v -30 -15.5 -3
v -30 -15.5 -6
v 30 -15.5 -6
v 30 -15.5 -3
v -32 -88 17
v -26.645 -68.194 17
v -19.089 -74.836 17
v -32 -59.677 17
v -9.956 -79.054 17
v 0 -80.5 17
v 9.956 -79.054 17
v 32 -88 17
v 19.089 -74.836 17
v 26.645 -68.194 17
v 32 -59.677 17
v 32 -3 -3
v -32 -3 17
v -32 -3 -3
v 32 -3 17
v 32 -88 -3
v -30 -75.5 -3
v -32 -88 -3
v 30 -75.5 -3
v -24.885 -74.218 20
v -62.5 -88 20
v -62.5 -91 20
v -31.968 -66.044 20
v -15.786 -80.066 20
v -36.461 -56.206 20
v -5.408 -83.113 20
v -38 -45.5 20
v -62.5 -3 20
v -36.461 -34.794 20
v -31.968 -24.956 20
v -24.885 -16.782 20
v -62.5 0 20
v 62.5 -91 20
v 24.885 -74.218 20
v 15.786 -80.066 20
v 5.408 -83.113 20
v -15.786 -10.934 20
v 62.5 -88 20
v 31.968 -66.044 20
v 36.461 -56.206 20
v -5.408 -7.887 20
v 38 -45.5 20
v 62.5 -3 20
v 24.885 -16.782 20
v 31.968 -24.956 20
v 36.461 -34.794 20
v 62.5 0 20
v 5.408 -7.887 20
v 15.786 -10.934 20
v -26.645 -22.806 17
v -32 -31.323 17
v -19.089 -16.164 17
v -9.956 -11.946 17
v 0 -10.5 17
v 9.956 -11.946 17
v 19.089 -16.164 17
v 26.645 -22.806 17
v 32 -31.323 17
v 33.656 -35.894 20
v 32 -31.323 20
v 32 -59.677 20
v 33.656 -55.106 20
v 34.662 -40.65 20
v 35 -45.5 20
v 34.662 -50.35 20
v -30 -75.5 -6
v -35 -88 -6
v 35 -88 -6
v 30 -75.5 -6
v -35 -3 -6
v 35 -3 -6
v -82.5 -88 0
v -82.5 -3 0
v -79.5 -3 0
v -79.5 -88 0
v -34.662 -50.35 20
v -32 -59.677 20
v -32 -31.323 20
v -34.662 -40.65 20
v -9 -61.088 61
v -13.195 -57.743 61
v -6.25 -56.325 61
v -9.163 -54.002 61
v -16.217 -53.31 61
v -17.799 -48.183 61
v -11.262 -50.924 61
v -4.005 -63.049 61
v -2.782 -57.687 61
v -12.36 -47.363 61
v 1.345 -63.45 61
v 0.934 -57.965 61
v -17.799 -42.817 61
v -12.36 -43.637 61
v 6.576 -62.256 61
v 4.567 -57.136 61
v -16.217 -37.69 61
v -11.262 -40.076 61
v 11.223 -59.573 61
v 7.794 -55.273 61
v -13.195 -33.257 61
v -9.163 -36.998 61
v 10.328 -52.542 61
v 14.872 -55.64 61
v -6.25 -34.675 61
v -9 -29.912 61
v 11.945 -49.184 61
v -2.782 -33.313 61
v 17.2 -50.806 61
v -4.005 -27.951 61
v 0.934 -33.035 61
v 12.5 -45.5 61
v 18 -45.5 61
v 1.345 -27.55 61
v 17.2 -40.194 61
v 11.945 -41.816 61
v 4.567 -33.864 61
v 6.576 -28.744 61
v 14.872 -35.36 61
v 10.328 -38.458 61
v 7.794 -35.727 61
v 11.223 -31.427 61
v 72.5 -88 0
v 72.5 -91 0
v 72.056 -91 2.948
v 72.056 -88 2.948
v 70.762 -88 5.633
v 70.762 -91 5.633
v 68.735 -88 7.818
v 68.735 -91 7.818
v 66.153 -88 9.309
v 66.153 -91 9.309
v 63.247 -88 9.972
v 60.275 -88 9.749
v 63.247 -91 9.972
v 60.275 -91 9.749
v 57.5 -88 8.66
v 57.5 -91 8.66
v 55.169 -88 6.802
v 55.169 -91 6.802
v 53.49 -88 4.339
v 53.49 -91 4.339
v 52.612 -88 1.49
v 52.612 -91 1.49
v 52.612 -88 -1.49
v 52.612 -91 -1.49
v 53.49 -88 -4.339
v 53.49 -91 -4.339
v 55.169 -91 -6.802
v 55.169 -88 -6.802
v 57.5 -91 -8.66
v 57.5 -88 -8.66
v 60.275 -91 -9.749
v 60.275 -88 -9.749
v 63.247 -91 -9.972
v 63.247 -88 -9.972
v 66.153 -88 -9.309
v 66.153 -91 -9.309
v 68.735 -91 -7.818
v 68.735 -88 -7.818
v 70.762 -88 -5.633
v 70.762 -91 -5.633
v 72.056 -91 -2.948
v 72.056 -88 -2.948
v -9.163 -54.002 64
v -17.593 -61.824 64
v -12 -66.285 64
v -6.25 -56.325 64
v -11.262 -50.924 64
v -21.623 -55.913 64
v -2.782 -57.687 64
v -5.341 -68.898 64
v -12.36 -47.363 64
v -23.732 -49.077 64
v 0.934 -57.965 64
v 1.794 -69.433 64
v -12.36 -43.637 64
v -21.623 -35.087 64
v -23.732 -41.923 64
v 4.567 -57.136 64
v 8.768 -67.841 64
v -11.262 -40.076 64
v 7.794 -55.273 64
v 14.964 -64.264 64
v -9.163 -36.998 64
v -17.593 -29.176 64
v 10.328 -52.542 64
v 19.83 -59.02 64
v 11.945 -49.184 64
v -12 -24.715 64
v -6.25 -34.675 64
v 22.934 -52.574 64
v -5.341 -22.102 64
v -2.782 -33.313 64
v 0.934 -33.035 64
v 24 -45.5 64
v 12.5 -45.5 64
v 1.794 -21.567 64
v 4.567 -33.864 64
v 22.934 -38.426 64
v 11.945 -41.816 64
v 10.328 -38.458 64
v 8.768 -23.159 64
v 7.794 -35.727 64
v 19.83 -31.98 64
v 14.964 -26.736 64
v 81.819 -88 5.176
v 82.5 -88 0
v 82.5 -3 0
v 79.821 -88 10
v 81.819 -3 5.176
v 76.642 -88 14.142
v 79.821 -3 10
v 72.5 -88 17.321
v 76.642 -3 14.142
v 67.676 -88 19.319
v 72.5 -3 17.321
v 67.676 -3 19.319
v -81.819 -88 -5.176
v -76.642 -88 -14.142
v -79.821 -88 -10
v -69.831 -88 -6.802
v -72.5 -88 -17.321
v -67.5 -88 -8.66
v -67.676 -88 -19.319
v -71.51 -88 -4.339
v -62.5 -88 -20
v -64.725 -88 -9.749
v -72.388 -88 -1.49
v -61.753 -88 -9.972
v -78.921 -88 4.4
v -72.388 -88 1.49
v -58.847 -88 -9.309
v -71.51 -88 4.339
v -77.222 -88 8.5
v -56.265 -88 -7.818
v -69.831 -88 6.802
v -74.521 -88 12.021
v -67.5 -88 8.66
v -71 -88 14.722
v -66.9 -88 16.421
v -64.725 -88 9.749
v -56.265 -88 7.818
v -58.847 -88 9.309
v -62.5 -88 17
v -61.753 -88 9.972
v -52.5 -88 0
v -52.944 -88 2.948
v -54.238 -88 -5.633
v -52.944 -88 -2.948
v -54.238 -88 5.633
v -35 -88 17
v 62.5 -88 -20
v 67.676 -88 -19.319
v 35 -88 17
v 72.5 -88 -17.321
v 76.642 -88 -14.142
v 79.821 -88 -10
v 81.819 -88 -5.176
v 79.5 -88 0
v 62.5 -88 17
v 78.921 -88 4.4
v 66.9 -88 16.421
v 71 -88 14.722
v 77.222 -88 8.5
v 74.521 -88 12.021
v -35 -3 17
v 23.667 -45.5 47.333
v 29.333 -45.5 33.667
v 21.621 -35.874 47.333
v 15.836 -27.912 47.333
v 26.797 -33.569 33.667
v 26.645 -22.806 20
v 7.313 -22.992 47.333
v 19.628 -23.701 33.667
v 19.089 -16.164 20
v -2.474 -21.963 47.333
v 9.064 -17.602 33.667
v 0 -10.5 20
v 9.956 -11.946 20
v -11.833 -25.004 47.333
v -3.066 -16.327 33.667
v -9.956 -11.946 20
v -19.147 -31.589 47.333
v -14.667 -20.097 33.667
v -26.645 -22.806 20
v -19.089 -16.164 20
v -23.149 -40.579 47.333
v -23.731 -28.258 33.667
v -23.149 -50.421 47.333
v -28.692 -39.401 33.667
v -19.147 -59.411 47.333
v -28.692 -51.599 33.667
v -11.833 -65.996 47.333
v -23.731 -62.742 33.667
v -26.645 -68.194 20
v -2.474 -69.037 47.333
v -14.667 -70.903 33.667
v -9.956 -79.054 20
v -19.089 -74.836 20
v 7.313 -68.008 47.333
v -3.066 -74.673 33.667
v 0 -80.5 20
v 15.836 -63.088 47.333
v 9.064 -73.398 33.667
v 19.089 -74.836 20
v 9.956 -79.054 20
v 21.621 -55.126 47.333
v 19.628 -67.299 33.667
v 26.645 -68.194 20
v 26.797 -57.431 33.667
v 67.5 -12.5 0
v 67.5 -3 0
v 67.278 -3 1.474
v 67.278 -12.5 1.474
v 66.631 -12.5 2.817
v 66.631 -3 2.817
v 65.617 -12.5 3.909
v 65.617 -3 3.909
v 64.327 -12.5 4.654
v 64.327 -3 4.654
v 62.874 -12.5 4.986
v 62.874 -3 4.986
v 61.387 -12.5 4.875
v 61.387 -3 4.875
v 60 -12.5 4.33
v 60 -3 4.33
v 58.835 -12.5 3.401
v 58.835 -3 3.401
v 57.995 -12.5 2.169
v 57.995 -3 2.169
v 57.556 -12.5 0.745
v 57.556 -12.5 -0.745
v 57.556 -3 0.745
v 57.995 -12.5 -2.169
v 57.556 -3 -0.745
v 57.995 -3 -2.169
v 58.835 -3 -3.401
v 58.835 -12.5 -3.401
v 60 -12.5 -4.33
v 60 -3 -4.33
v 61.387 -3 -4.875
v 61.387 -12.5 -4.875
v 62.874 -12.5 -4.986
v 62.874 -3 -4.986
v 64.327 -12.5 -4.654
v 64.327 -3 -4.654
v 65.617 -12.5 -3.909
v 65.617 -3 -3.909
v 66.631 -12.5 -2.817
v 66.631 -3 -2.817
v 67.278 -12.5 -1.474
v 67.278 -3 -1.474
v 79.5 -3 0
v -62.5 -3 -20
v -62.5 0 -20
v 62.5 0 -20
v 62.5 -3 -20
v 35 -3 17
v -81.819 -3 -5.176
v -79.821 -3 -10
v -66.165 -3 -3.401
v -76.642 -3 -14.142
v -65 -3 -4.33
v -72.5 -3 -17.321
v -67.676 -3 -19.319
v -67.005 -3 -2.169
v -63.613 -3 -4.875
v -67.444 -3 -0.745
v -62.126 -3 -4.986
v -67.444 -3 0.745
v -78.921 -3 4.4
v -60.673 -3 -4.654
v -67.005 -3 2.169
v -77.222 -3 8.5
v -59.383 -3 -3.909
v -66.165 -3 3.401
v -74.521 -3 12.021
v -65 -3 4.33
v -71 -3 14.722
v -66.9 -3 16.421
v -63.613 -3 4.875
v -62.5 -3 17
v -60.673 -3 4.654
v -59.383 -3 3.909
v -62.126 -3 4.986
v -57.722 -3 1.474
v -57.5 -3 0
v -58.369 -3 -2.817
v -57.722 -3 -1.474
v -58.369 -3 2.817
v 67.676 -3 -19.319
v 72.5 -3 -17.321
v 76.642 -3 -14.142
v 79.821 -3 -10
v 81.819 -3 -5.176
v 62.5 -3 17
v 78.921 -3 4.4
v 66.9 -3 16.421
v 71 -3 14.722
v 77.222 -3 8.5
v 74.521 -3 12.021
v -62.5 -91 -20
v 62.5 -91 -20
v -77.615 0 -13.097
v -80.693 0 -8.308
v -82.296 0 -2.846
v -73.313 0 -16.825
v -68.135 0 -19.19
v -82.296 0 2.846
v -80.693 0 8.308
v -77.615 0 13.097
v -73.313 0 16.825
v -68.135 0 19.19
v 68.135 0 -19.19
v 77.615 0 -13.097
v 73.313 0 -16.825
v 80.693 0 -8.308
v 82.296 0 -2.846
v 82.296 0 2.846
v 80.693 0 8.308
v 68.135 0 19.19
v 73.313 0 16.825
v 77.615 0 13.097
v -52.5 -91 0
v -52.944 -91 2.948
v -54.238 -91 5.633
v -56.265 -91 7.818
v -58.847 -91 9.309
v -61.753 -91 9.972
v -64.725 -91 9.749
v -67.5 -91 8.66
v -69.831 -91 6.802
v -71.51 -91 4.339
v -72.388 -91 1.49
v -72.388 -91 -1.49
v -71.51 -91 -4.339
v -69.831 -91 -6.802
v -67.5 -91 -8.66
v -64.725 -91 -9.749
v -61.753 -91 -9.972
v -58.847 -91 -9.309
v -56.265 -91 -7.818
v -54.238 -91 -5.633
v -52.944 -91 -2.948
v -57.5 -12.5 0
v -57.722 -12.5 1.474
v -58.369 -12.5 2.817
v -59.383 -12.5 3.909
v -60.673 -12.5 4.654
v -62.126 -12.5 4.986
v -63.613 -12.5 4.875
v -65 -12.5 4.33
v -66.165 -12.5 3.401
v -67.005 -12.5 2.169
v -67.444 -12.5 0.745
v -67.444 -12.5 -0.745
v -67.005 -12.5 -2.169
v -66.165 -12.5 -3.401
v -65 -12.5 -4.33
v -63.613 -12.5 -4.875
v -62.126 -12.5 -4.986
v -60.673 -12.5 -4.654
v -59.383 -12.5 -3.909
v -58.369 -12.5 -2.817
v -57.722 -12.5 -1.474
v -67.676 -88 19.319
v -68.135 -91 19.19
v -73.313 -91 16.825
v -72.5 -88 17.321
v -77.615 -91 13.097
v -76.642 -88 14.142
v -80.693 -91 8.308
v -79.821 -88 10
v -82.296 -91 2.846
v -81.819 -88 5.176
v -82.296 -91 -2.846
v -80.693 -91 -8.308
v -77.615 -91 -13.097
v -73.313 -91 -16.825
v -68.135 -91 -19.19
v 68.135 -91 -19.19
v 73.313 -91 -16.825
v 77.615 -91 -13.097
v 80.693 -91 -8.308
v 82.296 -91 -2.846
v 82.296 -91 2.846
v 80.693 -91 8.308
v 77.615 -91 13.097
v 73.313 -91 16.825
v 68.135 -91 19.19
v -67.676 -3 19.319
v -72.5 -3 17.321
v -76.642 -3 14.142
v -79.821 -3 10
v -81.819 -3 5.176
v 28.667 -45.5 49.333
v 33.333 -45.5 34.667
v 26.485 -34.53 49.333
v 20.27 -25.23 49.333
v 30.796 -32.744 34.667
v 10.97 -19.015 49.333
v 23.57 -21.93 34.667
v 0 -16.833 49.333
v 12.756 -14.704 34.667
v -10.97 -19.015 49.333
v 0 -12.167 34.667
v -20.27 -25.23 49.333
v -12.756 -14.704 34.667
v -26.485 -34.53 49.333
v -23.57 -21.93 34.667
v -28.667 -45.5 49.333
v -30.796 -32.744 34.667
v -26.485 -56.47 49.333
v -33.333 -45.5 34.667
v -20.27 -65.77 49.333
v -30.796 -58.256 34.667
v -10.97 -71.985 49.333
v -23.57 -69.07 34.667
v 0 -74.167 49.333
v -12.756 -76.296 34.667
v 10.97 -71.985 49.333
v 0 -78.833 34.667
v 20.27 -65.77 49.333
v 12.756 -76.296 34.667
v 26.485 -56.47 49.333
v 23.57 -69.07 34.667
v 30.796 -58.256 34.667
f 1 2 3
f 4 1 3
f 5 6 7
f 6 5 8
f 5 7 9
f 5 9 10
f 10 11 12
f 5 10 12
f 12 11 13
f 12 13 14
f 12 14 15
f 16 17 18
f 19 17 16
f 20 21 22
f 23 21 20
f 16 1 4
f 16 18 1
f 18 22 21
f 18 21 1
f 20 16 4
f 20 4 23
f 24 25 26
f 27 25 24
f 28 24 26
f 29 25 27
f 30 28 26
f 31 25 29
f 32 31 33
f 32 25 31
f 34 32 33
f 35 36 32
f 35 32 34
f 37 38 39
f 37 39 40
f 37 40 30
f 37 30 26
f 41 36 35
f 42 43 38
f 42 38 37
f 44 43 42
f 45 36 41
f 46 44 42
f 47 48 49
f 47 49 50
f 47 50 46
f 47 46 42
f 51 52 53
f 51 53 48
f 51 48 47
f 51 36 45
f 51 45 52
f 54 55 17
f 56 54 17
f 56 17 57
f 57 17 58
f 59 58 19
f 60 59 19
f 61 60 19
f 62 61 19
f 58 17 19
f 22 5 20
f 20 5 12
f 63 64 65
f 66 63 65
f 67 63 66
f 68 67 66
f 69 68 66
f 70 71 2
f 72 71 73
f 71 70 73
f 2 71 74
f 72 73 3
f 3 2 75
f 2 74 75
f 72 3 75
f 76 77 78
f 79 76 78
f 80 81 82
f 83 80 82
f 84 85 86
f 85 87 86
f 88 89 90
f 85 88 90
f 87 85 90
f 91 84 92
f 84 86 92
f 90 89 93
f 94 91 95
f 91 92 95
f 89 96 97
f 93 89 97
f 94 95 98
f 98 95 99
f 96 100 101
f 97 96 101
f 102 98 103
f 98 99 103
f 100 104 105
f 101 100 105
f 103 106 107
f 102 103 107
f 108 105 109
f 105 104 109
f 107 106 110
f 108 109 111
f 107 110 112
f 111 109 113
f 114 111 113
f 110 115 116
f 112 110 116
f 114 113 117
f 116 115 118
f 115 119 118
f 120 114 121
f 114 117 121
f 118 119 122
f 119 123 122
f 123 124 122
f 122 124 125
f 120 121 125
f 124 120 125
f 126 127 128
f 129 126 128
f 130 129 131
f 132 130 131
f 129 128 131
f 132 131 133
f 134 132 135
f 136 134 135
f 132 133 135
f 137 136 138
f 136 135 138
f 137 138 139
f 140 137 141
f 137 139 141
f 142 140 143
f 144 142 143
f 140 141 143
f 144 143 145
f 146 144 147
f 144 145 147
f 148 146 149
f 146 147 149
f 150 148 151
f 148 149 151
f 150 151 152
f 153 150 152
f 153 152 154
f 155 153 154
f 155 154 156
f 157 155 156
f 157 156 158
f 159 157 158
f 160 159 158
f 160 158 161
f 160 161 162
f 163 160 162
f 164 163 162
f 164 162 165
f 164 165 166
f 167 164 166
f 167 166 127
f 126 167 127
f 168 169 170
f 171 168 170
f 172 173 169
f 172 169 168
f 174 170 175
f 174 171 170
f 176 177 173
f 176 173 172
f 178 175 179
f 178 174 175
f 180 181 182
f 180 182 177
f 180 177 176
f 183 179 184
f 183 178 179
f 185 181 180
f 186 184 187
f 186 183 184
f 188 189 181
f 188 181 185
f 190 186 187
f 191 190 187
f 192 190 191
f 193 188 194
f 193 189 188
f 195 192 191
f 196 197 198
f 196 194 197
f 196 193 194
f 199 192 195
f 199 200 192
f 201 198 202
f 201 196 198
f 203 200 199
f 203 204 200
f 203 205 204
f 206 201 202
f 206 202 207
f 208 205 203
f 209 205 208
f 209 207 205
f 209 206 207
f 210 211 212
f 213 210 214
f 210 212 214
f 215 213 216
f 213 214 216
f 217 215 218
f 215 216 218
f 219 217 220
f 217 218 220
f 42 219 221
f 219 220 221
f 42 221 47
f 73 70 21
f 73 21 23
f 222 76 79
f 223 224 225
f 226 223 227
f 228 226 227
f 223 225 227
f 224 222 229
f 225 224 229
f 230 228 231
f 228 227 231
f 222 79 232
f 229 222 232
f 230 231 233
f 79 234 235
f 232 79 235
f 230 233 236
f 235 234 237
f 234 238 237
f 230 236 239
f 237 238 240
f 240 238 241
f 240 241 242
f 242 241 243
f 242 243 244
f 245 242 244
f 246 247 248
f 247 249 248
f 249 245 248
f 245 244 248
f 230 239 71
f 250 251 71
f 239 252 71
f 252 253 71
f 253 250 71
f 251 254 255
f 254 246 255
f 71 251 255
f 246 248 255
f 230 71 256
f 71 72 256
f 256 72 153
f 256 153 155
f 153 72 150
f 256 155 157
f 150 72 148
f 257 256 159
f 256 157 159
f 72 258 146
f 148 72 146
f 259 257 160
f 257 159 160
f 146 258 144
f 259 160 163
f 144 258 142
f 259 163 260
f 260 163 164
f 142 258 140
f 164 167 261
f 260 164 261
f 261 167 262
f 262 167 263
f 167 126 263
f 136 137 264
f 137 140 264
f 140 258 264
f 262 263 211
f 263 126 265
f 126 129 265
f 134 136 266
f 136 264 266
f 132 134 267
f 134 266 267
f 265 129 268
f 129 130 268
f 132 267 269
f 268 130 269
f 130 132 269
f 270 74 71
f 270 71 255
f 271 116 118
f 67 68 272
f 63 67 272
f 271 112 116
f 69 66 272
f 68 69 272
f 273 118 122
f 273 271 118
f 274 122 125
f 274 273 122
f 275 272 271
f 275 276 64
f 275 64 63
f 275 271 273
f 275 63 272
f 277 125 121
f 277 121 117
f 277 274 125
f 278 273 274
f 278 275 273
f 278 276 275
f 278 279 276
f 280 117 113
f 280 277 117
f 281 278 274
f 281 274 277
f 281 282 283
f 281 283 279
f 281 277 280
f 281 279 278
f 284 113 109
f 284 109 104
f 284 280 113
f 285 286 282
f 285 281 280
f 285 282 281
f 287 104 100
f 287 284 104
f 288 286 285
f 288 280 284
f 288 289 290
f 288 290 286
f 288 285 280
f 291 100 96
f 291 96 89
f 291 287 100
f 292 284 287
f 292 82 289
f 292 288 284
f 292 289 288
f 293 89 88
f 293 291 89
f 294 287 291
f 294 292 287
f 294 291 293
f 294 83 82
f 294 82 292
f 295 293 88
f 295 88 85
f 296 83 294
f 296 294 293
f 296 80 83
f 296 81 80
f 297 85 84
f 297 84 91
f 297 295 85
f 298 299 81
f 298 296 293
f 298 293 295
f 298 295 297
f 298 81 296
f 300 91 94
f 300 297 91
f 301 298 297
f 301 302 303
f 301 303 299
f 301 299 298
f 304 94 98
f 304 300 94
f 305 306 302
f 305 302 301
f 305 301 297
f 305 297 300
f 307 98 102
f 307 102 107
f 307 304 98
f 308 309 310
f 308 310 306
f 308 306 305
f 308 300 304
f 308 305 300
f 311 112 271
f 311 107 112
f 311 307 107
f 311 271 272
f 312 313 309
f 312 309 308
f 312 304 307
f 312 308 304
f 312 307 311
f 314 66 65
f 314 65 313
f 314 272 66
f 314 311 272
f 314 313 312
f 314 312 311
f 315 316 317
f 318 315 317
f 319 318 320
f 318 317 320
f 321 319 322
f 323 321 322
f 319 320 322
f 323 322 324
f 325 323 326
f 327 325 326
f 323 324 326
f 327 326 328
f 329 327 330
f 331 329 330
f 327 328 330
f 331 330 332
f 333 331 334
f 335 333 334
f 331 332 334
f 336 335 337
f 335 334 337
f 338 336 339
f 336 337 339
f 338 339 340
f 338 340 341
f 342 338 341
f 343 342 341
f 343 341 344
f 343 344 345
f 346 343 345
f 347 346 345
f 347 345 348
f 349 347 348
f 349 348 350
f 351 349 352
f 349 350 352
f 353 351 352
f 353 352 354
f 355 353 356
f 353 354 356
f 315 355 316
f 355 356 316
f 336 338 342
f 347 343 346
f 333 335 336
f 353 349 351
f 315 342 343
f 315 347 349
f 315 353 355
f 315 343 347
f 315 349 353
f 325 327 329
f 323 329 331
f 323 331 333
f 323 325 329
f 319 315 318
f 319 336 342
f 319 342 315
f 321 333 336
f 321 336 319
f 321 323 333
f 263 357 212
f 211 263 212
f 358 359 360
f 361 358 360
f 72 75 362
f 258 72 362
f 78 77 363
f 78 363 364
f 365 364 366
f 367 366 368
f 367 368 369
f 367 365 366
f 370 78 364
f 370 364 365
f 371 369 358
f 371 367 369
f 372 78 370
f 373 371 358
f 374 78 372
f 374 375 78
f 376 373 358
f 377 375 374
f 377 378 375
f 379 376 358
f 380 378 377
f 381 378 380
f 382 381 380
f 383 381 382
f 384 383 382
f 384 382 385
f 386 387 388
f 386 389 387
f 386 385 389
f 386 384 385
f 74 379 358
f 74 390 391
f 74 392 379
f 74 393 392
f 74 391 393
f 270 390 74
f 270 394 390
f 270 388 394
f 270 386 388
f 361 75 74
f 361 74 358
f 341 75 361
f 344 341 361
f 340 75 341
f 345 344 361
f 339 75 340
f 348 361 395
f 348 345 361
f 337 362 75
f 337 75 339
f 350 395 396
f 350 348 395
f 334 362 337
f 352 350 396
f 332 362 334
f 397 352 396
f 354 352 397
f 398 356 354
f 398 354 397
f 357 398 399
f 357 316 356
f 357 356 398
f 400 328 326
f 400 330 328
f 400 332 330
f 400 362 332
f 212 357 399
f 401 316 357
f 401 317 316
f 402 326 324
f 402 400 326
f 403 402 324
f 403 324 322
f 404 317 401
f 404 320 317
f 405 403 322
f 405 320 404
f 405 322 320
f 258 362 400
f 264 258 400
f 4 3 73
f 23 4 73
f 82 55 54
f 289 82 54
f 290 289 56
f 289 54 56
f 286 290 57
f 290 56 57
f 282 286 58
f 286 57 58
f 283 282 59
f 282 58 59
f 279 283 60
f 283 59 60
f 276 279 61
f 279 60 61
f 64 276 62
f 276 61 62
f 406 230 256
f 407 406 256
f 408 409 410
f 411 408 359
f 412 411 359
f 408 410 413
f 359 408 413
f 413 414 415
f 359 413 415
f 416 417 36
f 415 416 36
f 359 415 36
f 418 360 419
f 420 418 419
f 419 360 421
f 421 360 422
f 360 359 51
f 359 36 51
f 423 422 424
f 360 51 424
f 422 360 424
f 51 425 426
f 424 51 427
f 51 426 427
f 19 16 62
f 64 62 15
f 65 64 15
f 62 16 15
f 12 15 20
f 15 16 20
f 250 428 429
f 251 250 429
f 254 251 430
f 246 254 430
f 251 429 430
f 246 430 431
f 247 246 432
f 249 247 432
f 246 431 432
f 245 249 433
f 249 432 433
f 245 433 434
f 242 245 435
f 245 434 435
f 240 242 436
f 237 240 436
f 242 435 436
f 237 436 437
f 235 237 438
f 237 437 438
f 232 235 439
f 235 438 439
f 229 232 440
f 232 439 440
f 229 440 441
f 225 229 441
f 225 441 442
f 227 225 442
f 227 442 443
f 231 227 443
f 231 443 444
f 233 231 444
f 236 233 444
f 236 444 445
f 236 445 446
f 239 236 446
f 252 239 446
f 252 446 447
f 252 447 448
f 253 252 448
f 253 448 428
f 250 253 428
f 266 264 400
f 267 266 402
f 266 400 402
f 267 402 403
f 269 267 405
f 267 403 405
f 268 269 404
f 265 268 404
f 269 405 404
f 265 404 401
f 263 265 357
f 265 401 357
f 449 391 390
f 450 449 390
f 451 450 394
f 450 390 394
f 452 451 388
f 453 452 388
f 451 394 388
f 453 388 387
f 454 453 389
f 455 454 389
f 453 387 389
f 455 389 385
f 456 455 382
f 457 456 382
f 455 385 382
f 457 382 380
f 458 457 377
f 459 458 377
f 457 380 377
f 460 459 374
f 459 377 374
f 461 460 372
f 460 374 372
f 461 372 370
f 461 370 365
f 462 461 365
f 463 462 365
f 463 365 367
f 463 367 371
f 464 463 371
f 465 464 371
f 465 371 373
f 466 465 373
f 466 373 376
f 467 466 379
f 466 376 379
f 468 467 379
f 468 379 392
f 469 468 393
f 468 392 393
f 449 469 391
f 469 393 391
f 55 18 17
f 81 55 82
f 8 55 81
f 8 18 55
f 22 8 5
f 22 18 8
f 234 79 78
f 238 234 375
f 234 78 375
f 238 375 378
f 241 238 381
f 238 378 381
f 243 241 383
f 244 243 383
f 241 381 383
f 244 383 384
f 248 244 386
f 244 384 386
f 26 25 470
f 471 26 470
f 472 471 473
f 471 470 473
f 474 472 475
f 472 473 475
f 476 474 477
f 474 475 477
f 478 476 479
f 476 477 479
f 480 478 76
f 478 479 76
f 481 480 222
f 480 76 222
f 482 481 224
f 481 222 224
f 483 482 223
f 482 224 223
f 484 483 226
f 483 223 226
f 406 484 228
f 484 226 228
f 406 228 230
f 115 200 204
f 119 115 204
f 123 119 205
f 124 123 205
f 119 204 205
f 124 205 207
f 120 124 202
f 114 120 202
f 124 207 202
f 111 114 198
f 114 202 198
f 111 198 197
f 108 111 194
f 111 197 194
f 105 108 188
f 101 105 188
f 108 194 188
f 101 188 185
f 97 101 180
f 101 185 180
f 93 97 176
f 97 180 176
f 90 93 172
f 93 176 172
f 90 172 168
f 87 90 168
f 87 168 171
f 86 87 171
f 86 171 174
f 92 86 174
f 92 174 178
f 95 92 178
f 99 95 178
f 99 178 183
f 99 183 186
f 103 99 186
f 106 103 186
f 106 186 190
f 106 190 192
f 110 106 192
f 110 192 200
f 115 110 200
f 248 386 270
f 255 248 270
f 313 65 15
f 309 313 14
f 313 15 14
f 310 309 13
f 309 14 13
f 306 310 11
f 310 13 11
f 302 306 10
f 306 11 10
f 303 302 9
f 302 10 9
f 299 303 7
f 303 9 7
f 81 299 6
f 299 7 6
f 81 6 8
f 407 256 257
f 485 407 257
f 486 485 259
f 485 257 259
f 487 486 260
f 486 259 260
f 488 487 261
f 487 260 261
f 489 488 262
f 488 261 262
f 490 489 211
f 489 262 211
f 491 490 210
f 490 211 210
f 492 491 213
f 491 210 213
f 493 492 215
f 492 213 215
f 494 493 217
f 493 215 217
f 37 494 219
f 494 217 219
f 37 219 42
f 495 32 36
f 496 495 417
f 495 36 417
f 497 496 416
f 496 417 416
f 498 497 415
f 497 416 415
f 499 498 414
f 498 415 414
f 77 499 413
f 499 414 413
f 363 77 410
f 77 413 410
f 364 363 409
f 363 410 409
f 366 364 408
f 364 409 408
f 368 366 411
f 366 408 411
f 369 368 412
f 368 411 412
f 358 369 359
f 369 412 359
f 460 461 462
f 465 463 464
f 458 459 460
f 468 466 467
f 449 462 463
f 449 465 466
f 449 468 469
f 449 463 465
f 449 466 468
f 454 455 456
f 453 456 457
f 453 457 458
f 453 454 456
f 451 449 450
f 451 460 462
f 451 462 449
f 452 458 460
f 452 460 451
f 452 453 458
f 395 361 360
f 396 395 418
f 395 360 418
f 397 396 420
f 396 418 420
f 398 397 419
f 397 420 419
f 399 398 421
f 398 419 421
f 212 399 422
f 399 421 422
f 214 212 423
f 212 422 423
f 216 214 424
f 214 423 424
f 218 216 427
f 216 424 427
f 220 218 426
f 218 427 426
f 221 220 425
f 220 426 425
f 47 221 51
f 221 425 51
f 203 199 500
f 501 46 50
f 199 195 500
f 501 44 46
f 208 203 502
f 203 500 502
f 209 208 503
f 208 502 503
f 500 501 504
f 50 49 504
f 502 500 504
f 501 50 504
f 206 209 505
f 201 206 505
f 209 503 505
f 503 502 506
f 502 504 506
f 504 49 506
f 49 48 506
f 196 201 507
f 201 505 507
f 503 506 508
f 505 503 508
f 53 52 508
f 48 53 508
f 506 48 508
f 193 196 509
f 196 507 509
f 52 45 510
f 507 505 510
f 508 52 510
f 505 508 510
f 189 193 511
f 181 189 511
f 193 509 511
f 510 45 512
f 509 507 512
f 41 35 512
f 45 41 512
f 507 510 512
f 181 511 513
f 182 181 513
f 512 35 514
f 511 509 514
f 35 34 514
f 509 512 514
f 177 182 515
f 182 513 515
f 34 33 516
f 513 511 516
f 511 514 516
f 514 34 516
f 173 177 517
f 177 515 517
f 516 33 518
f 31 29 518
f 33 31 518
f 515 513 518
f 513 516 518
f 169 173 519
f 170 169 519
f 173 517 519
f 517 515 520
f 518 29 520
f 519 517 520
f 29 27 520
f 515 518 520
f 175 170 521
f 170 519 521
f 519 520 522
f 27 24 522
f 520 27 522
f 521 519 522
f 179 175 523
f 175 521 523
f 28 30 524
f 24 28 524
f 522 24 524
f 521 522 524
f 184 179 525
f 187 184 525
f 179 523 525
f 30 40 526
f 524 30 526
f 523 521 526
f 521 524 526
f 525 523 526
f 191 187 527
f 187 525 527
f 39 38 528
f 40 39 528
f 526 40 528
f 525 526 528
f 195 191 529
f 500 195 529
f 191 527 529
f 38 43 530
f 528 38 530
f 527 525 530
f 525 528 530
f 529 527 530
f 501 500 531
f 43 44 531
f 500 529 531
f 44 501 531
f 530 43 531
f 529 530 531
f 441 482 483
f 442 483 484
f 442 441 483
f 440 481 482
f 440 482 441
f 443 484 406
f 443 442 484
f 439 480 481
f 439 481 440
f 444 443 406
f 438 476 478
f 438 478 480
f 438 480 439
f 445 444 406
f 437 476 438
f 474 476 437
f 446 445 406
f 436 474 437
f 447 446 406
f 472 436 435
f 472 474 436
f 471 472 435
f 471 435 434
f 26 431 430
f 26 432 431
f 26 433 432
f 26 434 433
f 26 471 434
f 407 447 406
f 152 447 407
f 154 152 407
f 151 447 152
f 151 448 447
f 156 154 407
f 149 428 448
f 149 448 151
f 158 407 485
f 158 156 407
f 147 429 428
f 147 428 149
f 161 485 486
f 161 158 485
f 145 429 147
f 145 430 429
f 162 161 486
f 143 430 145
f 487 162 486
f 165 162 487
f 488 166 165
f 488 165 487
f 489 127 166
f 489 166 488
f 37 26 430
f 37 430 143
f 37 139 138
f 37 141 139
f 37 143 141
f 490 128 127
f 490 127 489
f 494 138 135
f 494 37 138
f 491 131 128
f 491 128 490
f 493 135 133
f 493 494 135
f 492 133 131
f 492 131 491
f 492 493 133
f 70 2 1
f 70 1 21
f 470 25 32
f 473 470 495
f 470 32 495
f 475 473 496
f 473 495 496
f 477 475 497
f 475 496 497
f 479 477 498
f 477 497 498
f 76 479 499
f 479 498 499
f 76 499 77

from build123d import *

# Parameters (mm, degrees)
F0_W      = 125
F0_H      = 40
F1_DEPTH  = 3
F2_W      = 125
F2_H      = 3
F3_DEPTH  = 85
F4_W      = 125
F4_H      = 40
F5_DEPTH  = 3
F6_R      = 35
F7_DEPTH  = 25
F10_R     = 24
F8_R      = 38
F12_R     = 12.5
F13_DEPTH = 70.6
F16_R     = 18
F14_R     = 35
F18_W     = 70
F18_H     = 3
F19_DEPTH = 85
F20_W     = 60
F20_H     = 60
F21_DEPTH = 15.5
F22_W     = 3
F22_H     = 85
F23_DEPTH = 26
F24_R     = 5
F25_DEPTH = 9.5
F26_R     = 10
F27_DEPTH = 25


with BuildPart() as f1:
    # F0 (on Front) → F1 (new body)
    with BuildSketch(Plane.XZ):
        Rectangle(F0_W, F0_H)
        with BuildLine():
            ThreePointArc((62.5, -20), (82.5, 0), (62.5, 20))
            Line((62.5, 20), (62.5, -20))
        make_face()
        with BuildLine():
            Line((-62.5, -20), (-62.5, 20))
            ThreePointArc((-62.5, 20), (-82.5, 0), (-62.5, -20))
        make_face()
    extrude(amount=F1_DEPTH)

    # F2 (on face) → F3 (join)
    with BuildSketch(Plane.XZ.offset(3)):
        with Locations((0, 18.5)):
            Rectangle(F2_W, F2_H)
        with BuildLine():
            Line((-62.5, 17), (-62.5, 20))
            ThreePointArc((-62.5, 20), (-76.6421356237, 14.1421356237), (-82.5, 0))
            Line((-82.5, 0), (-79.5, 0))
            ThreePointArc((-79.5, 0), (-74.5208152802, 12.0208152802), (-62.5, 17))
        make_face()
        with BuildLine():
            ThreePointArc((82.5, 0), (76.6421356237, 14.1421356237), (62.5, 20))
            Line((62.5, 20), (62.5, 17))
            ThreePointArc((62.5, 17), (74.5208152802, 12.0208152802), (79.5, 0))
            Line((79.5, 0), (82.5, 0))
        make_face()
    extrude(amount=F3_DEPTH)

    # F4 (on face) → F5 (join)
    with BuildSketch(Plane.XZ.offset(88)):
        Rectangle(F4_W, F4_H)
        with BuildLine():
            Line((-62.5, -20), (-62.5, 20))
            ThreePointArc((-62.5, 20), (-82.5, 0), (-62.5, -20))
        make_face()
        with BuildLine():
            ThreePointArc((62.5, -20), (82.5, 0), (62.5, 20))
            Line((62.5, 20), (62.5, -20))
        make_face()
    extrude(amount=F5_DEPTH)

    # F6 (on face) → F7 (cut)
    with BuildSketch(Plane(origin=(0, 0, 17), x_dir=(1, 0, 0), z_dir=(0, 0, -1))):
        with Locations((0, 45.5)):
            Circle(F6_R)
    extrude(amount=-F7_DEPTH, mode=Mode.SUBTRACT)

    # F10 (on offset) → F11 section 0
    with BuildSketch(Plane.XY.offset(64)):
        with Locations((0, -45.5)):
            Circle(F10_R)
    # F8 (on face) → F11 section 1
    with BuildSketch(Plane.XY.offset(20)):
        with Locations((0, -45.5)):
            Circle(F8_R)
    loft()

    # F12 (on face) → F13 (cut)
    with BuildSketch(Plane.XY.offset(64)):
        with Locations((0, -45.5)):
            Circle(F12_R)
    extrude(amount=-F13_DEPTH, mode=Mode.SUBTRACT)

    # F16 (on offset) → F17 section 0
    with BuildSketch(Plane.XY.offset(61)):
        with Locations((0, -45.5)):
            Circle(F16_R)
    # F14 (on face) → F17 section 1
    with BuildSketch(Plane.XY.offset(20)):
        with Locations((0, -45.5)):
            Circle(F14_R)
    loft(mode=Mode.SUBTRACT)

    # F18 (on face) → F19 (join)
    with BuildSketch(Plane.XZ.offset(3)):
        with Locations((0, -4.5)):
            Rectangle(F18_W, F18_H)
    extrude(amount=F19_DEPTH)

    # F20 (on face) → F21 (cut)
    with BuildSketch(Plane(origin=(0, 0, -6), x_dir=(1, 0, 0), z_dir=(0, 0, -1))):
        with Locations((0, 45.5)):
            Rectangle(F20_W, F20_H)
    extrude(amount=-F21_DEPTH, mode=Mode.SUBTRACT)

    # F22 (on face) → F23 (join)
    with BuildSketch(Plane(origin=(0, 0, -6), x_dir=(1, 0, 0), z_dir=(0, 0, -1))):
        with Locations((-33.5, 45.5)):
            Rectangle(F22_W, F22_H)
        with Locations((33.5, 45.5)):
            Rectangle(F22_W, F22_H)
    extrude(amount=-F23_DEPTH)

    # F24 (on face) → F25 (join)
    with BuildSketch(Plane.XZ.offset(3)):
        with Locations((-62.5, 0)):
            Circle(F24_R)
        with Locations((62.5, 0)):
            Circle(F24_R)
    extrude(amount=F25_DEPTH)

    # F26 (on face) → F27 (cut)
    with BuildSketch(Plane.XZ.offset(91)):
        with Locations((-62.5, 0)):
            Circle(F26_R)
        with Locations((62.5, 0)):
            Circle(F26_R)
    extrude(amount=-F27_DEPTH, mode=Mode.SUBTRACT)


solid = f1.part
